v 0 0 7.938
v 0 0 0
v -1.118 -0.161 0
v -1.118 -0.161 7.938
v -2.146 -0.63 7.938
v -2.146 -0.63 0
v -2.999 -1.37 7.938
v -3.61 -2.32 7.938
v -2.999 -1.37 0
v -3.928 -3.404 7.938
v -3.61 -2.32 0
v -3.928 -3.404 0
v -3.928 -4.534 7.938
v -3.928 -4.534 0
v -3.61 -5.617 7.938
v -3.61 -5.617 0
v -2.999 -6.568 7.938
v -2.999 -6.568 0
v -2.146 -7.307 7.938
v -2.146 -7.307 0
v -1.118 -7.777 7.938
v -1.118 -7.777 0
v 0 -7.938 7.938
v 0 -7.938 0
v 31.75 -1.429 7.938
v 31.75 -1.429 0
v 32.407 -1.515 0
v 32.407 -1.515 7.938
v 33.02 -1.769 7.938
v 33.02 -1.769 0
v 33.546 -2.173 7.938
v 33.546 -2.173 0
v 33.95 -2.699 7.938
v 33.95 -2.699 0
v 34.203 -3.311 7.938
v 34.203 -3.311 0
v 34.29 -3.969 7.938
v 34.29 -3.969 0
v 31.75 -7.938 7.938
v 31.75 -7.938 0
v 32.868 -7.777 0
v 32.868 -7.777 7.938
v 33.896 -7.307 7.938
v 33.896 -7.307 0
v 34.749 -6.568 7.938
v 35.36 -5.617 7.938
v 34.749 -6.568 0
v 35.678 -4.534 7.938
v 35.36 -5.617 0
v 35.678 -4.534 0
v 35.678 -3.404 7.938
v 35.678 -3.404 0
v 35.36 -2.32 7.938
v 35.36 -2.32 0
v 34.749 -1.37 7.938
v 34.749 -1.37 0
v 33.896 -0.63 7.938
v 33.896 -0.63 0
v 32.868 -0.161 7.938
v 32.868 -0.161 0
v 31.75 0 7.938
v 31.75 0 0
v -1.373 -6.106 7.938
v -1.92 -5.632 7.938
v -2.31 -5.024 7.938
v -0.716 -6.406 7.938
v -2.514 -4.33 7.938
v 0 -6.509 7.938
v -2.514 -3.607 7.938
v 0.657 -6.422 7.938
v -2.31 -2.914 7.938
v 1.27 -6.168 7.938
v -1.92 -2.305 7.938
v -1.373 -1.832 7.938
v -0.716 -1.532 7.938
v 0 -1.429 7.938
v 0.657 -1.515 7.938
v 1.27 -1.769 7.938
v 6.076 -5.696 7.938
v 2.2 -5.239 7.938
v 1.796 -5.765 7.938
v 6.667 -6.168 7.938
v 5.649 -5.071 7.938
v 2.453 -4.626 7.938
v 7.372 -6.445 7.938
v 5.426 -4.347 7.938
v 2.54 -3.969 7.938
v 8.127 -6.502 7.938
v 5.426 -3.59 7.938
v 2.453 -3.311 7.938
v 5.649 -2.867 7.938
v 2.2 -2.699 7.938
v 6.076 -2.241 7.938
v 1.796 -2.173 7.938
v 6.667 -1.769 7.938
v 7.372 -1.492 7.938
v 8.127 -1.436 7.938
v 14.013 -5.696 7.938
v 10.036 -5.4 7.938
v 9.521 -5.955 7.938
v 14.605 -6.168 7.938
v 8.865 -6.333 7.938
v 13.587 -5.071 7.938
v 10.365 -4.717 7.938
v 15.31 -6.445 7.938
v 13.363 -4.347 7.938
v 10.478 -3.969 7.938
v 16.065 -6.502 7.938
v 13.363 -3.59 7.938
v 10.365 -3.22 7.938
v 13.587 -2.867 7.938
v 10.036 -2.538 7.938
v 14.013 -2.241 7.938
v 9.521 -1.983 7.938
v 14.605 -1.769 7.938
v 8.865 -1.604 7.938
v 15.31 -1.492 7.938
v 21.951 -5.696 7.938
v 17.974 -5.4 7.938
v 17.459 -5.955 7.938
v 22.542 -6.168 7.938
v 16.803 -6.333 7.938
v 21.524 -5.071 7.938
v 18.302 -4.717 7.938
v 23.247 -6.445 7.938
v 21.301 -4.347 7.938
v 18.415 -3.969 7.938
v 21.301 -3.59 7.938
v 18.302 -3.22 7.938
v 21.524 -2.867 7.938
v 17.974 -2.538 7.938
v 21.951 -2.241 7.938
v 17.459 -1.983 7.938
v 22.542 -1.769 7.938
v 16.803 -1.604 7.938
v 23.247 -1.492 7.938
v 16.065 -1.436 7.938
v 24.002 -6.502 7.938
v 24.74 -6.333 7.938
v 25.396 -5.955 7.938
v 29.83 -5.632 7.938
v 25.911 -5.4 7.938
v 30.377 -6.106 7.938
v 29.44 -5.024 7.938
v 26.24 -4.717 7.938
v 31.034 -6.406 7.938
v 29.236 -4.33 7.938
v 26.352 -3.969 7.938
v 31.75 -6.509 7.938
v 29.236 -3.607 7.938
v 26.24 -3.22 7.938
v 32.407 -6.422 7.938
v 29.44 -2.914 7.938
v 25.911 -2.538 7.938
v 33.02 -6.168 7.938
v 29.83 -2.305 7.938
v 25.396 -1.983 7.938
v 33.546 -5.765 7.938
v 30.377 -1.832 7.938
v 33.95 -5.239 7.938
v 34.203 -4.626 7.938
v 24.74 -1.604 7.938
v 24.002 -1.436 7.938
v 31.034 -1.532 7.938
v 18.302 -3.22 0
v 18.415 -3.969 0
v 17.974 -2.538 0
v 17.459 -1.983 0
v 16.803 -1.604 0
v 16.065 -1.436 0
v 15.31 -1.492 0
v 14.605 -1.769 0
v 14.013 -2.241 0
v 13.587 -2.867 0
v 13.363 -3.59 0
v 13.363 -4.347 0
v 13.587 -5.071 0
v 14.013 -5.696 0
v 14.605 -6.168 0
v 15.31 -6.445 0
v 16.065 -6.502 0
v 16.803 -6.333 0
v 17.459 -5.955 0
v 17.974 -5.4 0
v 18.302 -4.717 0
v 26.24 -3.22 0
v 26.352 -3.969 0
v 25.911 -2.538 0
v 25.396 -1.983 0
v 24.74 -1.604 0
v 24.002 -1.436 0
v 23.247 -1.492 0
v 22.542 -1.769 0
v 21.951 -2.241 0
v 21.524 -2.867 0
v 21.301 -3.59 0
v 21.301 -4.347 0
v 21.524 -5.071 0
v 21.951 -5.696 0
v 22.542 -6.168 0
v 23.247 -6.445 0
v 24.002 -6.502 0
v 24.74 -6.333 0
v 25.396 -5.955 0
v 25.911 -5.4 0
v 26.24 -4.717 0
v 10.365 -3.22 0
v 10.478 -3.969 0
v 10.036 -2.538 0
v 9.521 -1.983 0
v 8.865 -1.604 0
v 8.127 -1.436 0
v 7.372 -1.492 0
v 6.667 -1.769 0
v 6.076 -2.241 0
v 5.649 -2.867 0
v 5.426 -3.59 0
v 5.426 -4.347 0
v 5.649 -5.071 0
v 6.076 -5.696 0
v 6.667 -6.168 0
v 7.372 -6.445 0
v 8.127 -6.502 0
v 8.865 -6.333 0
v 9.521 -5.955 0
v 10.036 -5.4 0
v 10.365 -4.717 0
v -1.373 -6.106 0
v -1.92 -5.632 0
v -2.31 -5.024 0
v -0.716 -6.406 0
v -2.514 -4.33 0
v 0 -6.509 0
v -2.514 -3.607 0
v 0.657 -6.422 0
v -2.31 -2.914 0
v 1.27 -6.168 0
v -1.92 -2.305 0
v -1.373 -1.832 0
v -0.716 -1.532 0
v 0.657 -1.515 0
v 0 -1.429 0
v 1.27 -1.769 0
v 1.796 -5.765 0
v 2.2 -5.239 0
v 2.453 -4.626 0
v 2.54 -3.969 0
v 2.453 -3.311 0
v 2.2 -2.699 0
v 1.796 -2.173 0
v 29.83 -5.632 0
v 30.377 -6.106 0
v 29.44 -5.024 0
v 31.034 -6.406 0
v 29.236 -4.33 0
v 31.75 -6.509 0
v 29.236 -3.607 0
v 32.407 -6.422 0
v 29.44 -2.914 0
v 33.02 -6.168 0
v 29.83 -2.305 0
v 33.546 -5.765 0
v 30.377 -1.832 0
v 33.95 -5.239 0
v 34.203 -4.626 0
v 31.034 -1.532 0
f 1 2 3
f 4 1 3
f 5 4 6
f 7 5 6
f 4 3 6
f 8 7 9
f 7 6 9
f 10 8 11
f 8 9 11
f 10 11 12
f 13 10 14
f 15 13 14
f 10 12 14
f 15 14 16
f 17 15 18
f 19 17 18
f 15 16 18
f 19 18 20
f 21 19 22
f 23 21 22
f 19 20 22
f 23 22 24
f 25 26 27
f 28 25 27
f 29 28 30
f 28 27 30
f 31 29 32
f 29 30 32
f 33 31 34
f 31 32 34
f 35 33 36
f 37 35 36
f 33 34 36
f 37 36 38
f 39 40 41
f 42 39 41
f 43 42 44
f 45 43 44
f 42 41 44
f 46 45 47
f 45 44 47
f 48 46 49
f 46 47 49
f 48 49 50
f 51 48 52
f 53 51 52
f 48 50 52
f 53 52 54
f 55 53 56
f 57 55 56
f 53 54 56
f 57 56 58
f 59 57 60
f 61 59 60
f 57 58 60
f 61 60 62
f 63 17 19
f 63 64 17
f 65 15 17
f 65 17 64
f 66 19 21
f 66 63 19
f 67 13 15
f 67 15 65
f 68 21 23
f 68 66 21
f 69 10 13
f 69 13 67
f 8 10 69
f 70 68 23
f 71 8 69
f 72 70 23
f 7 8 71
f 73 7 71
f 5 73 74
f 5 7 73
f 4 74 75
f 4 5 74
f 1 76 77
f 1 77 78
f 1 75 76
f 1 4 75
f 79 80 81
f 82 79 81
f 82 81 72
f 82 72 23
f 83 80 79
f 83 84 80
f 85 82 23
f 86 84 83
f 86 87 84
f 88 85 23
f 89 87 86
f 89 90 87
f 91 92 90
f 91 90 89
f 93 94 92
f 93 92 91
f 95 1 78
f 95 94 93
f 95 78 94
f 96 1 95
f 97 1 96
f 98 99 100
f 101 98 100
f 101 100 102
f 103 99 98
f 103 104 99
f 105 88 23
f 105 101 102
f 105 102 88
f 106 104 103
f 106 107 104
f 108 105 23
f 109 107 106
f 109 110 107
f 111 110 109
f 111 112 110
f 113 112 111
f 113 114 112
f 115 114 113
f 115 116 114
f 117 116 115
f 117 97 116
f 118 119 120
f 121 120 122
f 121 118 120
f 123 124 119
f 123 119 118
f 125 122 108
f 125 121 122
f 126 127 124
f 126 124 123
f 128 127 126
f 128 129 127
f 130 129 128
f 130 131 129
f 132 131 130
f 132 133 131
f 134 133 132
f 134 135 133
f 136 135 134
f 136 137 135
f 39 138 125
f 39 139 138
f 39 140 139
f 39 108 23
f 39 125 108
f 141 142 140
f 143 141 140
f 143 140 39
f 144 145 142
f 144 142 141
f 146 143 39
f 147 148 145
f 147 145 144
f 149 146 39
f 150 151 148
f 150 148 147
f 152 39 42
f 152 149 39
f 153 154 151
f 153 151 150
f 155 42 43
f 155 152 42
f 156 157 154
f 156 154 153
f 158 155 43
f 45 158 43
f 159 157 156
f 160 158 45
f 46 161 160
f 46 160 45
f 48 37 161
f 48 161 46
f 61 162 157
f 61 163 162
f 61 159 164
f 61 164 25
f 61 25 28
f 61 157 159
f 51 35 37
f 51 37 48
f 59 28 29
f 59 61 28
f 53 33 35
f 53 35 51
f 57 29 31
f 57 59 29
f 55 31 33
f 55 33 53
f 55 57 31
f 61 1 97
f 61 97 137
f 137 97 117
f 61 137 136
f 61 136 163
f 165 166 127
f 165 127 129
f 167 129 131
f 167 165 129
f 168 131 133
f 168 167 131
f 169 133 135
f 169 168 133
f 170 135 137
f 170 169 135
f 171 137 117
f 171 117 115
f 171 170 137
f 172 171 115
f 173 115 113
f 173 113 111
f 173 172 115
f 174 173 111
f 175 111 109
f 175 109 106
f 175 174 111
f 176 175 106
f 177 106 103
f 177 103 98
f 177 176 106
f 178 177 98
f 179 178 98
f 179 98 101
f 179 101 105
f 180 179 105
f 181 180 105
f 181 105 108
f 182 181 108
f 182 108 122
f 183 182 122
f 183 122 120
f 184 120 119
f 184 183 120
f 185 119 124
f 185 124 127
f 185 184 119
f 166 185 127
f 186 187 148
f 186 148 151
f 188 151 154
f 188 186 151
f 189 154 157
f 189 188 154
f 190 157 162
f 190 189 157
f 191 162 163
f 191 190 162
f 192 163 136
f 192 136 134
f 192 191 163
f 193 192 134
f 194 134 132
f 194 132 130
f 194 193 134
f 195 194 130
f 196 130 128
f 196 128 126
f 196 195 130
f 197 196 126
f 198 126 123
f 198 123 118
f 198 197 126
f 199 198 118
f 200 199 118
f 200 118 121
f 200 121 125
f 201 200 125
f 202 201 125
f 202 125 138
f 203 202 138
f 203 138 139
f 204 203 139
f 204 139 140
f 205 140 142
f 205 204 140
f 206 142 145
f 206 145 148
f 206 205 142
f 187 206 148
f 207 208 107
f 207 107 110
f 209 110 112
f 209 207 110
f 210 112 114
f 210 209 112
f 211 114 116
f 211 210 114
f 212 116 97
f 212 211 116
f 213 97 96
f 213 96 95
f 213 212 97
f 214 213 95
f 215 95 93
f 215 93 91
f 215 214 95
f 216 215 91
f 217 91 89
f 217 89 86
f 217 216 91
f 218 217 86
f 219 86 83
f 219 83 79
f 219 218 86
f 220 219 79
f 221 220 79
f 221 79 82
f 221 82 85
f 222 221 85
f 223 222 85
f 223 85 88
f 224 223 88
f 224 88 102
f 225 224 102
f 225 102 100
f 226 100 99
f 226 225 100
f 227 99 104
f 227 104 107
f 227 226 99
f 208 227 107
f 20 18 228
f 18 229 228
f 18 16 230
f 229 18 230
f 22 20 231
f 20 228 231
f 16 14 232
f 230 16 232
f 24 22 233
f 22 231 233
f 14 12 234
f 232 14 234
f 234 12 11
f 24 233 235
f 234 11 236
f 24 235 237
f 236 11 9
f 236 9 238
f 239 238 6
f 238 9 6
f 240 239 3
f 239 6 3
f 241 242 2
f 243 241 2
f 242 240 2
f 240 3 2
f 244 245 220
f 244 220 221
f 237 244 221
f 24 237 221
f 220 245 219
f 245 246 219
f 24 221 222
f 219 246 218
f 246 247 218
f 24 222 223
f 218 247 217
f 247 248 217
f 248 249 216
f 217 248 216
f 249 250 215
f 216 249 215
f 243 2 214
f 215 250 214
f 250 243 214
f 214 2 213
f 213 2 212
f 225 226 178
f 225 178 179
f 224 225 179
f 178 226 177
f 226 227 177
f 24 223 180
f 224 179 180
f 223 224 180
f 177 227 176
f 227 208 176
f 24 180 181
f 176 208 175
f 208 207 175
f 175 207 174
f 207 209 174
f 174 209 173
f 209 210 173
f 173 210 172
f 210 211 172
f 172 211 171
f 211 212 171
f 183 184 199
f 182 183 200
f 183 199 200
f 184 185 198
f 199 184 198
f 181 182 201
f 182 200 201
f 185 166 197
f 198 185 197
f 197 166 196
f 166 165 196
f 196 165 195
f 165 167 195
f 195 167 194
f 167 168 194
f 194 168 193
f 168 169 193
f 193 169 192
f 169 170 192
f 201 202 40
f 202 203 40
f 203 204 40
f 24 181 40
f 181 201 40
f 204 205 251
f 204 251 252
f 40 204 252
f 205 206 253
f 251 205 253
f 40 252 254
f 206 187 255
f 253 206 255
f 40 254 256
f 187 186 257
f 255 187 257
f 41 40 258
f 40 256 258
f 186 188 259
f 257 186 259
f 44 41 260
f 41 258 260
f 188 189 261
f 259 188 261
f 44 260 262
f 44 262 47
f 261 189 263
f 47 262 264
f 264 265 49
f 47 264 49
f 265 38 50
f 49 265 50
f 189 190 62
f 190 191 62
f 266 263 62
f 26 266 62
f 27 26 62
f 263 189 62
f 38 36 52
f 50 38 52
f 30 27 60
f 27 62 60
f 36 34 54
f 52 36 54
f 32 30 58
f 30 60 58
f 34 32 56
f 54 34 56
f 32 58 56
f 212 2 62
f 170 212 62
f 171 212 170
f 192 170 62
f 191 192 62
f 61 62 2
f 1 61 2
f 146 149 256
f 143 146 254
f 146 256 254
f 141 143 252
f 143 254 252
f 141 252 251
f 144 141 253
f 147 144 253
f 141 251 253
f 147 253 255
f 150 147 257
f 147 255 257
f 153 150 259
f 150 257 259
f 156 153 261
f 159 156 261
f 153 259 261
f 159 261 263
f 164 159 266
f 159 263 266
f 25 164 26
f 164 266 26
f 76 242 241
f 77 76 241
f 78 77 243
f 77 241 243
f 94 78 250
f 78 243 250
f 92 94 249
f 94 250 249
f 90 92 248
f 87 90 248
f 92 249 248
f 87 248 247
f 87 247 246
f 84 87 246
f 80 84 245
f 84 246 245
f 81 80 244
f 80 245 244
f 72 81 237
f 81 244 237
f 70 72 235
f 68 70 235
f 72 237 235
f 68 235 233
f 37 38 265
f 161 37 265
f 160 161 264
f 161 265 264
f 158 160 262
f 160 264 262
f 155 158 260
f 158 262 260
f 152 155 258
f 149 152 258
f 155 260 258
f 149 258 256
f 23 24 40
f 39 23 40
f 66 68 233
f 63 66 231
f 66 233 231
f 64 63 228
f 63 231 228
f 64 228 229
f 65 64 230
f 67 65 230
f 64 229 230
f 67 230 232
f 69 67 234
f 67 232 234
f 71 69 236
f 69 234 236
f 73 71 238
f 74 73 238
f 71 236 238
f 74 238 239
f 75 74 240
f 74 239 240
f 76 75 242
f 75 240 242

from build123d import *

# Parameters (mm, degrees)
F0_R     = 2.54
F1_DEPTH = 7.9375


with BuildPart() as f1:
    # F0 (on Top) → F1 (new body)
    with BuildSketch(Plane.XY):
        with BuildLine():
            Line((31.75, 0), (0, 0))
            Line((0, 0), (0, -1.42875))
            ThreePointArc((0, -1.42875), (1.796051, -2.172699), (2.54, -3.96875))
            ThreePointArc((2.54, -3.96875), (1.796051, -5.764801), (0, -6.50875))
            Line((0, -6.50875), (0, -7.9375))
            Line((0, -7.9375), (31.75, -7.9375))
            Line((31.75, -7.9375), (31.75, -6.50875))
            ThreePointArc((31.75, -6.50875), (29.21, -3.96875), (31.75, -1.42875))
            Line((31.75, -1.42875), (31.75, 0))
        make_face()
        with Locations((7.9375, -3.96875)):
            Circle(F0_R, mode=Mode.SUBTRACT)
        with Locations((15.875, -3.96875)):
            Circle(F0_R, mode=Mode.SUBTRACT)
        with Locations((23.8125, -3.96875)):
            Circle(F0_R, mode=Mode.SUBTRACT)
        with BuildLine():
            Line((0, -1.42875), (0, 0))
            ThreePointArc((0, 0), (-3.96875, -3.96875), (0, -7.9375))
            Line((0, -7.9375), (0, -6.50875))
            ThreePointArc((0, -6.50875), (-2.54, -3.96875), (0, -1.42875))
        make_face()
        with BuildLine():
            ThreePointArc((31.75, -7.9375), (35.71875, -3.96875), (31.75, 0))
            Line((31.75, 0), (31.75, -1.42875))
            ThreePointArc((31.75, -1.42875), (33.546051, -2.172699), (34.29, -3.96875))
            ThreePointArc((34.29, -3.96875), (33.546051, -5.764801), (31.75, -6.50875))
            Line((31.75, -6.50875), (31.75, -7.9375))
        make_face()
    extrude(amount=F1_DEPTH)


solid = f1.part
